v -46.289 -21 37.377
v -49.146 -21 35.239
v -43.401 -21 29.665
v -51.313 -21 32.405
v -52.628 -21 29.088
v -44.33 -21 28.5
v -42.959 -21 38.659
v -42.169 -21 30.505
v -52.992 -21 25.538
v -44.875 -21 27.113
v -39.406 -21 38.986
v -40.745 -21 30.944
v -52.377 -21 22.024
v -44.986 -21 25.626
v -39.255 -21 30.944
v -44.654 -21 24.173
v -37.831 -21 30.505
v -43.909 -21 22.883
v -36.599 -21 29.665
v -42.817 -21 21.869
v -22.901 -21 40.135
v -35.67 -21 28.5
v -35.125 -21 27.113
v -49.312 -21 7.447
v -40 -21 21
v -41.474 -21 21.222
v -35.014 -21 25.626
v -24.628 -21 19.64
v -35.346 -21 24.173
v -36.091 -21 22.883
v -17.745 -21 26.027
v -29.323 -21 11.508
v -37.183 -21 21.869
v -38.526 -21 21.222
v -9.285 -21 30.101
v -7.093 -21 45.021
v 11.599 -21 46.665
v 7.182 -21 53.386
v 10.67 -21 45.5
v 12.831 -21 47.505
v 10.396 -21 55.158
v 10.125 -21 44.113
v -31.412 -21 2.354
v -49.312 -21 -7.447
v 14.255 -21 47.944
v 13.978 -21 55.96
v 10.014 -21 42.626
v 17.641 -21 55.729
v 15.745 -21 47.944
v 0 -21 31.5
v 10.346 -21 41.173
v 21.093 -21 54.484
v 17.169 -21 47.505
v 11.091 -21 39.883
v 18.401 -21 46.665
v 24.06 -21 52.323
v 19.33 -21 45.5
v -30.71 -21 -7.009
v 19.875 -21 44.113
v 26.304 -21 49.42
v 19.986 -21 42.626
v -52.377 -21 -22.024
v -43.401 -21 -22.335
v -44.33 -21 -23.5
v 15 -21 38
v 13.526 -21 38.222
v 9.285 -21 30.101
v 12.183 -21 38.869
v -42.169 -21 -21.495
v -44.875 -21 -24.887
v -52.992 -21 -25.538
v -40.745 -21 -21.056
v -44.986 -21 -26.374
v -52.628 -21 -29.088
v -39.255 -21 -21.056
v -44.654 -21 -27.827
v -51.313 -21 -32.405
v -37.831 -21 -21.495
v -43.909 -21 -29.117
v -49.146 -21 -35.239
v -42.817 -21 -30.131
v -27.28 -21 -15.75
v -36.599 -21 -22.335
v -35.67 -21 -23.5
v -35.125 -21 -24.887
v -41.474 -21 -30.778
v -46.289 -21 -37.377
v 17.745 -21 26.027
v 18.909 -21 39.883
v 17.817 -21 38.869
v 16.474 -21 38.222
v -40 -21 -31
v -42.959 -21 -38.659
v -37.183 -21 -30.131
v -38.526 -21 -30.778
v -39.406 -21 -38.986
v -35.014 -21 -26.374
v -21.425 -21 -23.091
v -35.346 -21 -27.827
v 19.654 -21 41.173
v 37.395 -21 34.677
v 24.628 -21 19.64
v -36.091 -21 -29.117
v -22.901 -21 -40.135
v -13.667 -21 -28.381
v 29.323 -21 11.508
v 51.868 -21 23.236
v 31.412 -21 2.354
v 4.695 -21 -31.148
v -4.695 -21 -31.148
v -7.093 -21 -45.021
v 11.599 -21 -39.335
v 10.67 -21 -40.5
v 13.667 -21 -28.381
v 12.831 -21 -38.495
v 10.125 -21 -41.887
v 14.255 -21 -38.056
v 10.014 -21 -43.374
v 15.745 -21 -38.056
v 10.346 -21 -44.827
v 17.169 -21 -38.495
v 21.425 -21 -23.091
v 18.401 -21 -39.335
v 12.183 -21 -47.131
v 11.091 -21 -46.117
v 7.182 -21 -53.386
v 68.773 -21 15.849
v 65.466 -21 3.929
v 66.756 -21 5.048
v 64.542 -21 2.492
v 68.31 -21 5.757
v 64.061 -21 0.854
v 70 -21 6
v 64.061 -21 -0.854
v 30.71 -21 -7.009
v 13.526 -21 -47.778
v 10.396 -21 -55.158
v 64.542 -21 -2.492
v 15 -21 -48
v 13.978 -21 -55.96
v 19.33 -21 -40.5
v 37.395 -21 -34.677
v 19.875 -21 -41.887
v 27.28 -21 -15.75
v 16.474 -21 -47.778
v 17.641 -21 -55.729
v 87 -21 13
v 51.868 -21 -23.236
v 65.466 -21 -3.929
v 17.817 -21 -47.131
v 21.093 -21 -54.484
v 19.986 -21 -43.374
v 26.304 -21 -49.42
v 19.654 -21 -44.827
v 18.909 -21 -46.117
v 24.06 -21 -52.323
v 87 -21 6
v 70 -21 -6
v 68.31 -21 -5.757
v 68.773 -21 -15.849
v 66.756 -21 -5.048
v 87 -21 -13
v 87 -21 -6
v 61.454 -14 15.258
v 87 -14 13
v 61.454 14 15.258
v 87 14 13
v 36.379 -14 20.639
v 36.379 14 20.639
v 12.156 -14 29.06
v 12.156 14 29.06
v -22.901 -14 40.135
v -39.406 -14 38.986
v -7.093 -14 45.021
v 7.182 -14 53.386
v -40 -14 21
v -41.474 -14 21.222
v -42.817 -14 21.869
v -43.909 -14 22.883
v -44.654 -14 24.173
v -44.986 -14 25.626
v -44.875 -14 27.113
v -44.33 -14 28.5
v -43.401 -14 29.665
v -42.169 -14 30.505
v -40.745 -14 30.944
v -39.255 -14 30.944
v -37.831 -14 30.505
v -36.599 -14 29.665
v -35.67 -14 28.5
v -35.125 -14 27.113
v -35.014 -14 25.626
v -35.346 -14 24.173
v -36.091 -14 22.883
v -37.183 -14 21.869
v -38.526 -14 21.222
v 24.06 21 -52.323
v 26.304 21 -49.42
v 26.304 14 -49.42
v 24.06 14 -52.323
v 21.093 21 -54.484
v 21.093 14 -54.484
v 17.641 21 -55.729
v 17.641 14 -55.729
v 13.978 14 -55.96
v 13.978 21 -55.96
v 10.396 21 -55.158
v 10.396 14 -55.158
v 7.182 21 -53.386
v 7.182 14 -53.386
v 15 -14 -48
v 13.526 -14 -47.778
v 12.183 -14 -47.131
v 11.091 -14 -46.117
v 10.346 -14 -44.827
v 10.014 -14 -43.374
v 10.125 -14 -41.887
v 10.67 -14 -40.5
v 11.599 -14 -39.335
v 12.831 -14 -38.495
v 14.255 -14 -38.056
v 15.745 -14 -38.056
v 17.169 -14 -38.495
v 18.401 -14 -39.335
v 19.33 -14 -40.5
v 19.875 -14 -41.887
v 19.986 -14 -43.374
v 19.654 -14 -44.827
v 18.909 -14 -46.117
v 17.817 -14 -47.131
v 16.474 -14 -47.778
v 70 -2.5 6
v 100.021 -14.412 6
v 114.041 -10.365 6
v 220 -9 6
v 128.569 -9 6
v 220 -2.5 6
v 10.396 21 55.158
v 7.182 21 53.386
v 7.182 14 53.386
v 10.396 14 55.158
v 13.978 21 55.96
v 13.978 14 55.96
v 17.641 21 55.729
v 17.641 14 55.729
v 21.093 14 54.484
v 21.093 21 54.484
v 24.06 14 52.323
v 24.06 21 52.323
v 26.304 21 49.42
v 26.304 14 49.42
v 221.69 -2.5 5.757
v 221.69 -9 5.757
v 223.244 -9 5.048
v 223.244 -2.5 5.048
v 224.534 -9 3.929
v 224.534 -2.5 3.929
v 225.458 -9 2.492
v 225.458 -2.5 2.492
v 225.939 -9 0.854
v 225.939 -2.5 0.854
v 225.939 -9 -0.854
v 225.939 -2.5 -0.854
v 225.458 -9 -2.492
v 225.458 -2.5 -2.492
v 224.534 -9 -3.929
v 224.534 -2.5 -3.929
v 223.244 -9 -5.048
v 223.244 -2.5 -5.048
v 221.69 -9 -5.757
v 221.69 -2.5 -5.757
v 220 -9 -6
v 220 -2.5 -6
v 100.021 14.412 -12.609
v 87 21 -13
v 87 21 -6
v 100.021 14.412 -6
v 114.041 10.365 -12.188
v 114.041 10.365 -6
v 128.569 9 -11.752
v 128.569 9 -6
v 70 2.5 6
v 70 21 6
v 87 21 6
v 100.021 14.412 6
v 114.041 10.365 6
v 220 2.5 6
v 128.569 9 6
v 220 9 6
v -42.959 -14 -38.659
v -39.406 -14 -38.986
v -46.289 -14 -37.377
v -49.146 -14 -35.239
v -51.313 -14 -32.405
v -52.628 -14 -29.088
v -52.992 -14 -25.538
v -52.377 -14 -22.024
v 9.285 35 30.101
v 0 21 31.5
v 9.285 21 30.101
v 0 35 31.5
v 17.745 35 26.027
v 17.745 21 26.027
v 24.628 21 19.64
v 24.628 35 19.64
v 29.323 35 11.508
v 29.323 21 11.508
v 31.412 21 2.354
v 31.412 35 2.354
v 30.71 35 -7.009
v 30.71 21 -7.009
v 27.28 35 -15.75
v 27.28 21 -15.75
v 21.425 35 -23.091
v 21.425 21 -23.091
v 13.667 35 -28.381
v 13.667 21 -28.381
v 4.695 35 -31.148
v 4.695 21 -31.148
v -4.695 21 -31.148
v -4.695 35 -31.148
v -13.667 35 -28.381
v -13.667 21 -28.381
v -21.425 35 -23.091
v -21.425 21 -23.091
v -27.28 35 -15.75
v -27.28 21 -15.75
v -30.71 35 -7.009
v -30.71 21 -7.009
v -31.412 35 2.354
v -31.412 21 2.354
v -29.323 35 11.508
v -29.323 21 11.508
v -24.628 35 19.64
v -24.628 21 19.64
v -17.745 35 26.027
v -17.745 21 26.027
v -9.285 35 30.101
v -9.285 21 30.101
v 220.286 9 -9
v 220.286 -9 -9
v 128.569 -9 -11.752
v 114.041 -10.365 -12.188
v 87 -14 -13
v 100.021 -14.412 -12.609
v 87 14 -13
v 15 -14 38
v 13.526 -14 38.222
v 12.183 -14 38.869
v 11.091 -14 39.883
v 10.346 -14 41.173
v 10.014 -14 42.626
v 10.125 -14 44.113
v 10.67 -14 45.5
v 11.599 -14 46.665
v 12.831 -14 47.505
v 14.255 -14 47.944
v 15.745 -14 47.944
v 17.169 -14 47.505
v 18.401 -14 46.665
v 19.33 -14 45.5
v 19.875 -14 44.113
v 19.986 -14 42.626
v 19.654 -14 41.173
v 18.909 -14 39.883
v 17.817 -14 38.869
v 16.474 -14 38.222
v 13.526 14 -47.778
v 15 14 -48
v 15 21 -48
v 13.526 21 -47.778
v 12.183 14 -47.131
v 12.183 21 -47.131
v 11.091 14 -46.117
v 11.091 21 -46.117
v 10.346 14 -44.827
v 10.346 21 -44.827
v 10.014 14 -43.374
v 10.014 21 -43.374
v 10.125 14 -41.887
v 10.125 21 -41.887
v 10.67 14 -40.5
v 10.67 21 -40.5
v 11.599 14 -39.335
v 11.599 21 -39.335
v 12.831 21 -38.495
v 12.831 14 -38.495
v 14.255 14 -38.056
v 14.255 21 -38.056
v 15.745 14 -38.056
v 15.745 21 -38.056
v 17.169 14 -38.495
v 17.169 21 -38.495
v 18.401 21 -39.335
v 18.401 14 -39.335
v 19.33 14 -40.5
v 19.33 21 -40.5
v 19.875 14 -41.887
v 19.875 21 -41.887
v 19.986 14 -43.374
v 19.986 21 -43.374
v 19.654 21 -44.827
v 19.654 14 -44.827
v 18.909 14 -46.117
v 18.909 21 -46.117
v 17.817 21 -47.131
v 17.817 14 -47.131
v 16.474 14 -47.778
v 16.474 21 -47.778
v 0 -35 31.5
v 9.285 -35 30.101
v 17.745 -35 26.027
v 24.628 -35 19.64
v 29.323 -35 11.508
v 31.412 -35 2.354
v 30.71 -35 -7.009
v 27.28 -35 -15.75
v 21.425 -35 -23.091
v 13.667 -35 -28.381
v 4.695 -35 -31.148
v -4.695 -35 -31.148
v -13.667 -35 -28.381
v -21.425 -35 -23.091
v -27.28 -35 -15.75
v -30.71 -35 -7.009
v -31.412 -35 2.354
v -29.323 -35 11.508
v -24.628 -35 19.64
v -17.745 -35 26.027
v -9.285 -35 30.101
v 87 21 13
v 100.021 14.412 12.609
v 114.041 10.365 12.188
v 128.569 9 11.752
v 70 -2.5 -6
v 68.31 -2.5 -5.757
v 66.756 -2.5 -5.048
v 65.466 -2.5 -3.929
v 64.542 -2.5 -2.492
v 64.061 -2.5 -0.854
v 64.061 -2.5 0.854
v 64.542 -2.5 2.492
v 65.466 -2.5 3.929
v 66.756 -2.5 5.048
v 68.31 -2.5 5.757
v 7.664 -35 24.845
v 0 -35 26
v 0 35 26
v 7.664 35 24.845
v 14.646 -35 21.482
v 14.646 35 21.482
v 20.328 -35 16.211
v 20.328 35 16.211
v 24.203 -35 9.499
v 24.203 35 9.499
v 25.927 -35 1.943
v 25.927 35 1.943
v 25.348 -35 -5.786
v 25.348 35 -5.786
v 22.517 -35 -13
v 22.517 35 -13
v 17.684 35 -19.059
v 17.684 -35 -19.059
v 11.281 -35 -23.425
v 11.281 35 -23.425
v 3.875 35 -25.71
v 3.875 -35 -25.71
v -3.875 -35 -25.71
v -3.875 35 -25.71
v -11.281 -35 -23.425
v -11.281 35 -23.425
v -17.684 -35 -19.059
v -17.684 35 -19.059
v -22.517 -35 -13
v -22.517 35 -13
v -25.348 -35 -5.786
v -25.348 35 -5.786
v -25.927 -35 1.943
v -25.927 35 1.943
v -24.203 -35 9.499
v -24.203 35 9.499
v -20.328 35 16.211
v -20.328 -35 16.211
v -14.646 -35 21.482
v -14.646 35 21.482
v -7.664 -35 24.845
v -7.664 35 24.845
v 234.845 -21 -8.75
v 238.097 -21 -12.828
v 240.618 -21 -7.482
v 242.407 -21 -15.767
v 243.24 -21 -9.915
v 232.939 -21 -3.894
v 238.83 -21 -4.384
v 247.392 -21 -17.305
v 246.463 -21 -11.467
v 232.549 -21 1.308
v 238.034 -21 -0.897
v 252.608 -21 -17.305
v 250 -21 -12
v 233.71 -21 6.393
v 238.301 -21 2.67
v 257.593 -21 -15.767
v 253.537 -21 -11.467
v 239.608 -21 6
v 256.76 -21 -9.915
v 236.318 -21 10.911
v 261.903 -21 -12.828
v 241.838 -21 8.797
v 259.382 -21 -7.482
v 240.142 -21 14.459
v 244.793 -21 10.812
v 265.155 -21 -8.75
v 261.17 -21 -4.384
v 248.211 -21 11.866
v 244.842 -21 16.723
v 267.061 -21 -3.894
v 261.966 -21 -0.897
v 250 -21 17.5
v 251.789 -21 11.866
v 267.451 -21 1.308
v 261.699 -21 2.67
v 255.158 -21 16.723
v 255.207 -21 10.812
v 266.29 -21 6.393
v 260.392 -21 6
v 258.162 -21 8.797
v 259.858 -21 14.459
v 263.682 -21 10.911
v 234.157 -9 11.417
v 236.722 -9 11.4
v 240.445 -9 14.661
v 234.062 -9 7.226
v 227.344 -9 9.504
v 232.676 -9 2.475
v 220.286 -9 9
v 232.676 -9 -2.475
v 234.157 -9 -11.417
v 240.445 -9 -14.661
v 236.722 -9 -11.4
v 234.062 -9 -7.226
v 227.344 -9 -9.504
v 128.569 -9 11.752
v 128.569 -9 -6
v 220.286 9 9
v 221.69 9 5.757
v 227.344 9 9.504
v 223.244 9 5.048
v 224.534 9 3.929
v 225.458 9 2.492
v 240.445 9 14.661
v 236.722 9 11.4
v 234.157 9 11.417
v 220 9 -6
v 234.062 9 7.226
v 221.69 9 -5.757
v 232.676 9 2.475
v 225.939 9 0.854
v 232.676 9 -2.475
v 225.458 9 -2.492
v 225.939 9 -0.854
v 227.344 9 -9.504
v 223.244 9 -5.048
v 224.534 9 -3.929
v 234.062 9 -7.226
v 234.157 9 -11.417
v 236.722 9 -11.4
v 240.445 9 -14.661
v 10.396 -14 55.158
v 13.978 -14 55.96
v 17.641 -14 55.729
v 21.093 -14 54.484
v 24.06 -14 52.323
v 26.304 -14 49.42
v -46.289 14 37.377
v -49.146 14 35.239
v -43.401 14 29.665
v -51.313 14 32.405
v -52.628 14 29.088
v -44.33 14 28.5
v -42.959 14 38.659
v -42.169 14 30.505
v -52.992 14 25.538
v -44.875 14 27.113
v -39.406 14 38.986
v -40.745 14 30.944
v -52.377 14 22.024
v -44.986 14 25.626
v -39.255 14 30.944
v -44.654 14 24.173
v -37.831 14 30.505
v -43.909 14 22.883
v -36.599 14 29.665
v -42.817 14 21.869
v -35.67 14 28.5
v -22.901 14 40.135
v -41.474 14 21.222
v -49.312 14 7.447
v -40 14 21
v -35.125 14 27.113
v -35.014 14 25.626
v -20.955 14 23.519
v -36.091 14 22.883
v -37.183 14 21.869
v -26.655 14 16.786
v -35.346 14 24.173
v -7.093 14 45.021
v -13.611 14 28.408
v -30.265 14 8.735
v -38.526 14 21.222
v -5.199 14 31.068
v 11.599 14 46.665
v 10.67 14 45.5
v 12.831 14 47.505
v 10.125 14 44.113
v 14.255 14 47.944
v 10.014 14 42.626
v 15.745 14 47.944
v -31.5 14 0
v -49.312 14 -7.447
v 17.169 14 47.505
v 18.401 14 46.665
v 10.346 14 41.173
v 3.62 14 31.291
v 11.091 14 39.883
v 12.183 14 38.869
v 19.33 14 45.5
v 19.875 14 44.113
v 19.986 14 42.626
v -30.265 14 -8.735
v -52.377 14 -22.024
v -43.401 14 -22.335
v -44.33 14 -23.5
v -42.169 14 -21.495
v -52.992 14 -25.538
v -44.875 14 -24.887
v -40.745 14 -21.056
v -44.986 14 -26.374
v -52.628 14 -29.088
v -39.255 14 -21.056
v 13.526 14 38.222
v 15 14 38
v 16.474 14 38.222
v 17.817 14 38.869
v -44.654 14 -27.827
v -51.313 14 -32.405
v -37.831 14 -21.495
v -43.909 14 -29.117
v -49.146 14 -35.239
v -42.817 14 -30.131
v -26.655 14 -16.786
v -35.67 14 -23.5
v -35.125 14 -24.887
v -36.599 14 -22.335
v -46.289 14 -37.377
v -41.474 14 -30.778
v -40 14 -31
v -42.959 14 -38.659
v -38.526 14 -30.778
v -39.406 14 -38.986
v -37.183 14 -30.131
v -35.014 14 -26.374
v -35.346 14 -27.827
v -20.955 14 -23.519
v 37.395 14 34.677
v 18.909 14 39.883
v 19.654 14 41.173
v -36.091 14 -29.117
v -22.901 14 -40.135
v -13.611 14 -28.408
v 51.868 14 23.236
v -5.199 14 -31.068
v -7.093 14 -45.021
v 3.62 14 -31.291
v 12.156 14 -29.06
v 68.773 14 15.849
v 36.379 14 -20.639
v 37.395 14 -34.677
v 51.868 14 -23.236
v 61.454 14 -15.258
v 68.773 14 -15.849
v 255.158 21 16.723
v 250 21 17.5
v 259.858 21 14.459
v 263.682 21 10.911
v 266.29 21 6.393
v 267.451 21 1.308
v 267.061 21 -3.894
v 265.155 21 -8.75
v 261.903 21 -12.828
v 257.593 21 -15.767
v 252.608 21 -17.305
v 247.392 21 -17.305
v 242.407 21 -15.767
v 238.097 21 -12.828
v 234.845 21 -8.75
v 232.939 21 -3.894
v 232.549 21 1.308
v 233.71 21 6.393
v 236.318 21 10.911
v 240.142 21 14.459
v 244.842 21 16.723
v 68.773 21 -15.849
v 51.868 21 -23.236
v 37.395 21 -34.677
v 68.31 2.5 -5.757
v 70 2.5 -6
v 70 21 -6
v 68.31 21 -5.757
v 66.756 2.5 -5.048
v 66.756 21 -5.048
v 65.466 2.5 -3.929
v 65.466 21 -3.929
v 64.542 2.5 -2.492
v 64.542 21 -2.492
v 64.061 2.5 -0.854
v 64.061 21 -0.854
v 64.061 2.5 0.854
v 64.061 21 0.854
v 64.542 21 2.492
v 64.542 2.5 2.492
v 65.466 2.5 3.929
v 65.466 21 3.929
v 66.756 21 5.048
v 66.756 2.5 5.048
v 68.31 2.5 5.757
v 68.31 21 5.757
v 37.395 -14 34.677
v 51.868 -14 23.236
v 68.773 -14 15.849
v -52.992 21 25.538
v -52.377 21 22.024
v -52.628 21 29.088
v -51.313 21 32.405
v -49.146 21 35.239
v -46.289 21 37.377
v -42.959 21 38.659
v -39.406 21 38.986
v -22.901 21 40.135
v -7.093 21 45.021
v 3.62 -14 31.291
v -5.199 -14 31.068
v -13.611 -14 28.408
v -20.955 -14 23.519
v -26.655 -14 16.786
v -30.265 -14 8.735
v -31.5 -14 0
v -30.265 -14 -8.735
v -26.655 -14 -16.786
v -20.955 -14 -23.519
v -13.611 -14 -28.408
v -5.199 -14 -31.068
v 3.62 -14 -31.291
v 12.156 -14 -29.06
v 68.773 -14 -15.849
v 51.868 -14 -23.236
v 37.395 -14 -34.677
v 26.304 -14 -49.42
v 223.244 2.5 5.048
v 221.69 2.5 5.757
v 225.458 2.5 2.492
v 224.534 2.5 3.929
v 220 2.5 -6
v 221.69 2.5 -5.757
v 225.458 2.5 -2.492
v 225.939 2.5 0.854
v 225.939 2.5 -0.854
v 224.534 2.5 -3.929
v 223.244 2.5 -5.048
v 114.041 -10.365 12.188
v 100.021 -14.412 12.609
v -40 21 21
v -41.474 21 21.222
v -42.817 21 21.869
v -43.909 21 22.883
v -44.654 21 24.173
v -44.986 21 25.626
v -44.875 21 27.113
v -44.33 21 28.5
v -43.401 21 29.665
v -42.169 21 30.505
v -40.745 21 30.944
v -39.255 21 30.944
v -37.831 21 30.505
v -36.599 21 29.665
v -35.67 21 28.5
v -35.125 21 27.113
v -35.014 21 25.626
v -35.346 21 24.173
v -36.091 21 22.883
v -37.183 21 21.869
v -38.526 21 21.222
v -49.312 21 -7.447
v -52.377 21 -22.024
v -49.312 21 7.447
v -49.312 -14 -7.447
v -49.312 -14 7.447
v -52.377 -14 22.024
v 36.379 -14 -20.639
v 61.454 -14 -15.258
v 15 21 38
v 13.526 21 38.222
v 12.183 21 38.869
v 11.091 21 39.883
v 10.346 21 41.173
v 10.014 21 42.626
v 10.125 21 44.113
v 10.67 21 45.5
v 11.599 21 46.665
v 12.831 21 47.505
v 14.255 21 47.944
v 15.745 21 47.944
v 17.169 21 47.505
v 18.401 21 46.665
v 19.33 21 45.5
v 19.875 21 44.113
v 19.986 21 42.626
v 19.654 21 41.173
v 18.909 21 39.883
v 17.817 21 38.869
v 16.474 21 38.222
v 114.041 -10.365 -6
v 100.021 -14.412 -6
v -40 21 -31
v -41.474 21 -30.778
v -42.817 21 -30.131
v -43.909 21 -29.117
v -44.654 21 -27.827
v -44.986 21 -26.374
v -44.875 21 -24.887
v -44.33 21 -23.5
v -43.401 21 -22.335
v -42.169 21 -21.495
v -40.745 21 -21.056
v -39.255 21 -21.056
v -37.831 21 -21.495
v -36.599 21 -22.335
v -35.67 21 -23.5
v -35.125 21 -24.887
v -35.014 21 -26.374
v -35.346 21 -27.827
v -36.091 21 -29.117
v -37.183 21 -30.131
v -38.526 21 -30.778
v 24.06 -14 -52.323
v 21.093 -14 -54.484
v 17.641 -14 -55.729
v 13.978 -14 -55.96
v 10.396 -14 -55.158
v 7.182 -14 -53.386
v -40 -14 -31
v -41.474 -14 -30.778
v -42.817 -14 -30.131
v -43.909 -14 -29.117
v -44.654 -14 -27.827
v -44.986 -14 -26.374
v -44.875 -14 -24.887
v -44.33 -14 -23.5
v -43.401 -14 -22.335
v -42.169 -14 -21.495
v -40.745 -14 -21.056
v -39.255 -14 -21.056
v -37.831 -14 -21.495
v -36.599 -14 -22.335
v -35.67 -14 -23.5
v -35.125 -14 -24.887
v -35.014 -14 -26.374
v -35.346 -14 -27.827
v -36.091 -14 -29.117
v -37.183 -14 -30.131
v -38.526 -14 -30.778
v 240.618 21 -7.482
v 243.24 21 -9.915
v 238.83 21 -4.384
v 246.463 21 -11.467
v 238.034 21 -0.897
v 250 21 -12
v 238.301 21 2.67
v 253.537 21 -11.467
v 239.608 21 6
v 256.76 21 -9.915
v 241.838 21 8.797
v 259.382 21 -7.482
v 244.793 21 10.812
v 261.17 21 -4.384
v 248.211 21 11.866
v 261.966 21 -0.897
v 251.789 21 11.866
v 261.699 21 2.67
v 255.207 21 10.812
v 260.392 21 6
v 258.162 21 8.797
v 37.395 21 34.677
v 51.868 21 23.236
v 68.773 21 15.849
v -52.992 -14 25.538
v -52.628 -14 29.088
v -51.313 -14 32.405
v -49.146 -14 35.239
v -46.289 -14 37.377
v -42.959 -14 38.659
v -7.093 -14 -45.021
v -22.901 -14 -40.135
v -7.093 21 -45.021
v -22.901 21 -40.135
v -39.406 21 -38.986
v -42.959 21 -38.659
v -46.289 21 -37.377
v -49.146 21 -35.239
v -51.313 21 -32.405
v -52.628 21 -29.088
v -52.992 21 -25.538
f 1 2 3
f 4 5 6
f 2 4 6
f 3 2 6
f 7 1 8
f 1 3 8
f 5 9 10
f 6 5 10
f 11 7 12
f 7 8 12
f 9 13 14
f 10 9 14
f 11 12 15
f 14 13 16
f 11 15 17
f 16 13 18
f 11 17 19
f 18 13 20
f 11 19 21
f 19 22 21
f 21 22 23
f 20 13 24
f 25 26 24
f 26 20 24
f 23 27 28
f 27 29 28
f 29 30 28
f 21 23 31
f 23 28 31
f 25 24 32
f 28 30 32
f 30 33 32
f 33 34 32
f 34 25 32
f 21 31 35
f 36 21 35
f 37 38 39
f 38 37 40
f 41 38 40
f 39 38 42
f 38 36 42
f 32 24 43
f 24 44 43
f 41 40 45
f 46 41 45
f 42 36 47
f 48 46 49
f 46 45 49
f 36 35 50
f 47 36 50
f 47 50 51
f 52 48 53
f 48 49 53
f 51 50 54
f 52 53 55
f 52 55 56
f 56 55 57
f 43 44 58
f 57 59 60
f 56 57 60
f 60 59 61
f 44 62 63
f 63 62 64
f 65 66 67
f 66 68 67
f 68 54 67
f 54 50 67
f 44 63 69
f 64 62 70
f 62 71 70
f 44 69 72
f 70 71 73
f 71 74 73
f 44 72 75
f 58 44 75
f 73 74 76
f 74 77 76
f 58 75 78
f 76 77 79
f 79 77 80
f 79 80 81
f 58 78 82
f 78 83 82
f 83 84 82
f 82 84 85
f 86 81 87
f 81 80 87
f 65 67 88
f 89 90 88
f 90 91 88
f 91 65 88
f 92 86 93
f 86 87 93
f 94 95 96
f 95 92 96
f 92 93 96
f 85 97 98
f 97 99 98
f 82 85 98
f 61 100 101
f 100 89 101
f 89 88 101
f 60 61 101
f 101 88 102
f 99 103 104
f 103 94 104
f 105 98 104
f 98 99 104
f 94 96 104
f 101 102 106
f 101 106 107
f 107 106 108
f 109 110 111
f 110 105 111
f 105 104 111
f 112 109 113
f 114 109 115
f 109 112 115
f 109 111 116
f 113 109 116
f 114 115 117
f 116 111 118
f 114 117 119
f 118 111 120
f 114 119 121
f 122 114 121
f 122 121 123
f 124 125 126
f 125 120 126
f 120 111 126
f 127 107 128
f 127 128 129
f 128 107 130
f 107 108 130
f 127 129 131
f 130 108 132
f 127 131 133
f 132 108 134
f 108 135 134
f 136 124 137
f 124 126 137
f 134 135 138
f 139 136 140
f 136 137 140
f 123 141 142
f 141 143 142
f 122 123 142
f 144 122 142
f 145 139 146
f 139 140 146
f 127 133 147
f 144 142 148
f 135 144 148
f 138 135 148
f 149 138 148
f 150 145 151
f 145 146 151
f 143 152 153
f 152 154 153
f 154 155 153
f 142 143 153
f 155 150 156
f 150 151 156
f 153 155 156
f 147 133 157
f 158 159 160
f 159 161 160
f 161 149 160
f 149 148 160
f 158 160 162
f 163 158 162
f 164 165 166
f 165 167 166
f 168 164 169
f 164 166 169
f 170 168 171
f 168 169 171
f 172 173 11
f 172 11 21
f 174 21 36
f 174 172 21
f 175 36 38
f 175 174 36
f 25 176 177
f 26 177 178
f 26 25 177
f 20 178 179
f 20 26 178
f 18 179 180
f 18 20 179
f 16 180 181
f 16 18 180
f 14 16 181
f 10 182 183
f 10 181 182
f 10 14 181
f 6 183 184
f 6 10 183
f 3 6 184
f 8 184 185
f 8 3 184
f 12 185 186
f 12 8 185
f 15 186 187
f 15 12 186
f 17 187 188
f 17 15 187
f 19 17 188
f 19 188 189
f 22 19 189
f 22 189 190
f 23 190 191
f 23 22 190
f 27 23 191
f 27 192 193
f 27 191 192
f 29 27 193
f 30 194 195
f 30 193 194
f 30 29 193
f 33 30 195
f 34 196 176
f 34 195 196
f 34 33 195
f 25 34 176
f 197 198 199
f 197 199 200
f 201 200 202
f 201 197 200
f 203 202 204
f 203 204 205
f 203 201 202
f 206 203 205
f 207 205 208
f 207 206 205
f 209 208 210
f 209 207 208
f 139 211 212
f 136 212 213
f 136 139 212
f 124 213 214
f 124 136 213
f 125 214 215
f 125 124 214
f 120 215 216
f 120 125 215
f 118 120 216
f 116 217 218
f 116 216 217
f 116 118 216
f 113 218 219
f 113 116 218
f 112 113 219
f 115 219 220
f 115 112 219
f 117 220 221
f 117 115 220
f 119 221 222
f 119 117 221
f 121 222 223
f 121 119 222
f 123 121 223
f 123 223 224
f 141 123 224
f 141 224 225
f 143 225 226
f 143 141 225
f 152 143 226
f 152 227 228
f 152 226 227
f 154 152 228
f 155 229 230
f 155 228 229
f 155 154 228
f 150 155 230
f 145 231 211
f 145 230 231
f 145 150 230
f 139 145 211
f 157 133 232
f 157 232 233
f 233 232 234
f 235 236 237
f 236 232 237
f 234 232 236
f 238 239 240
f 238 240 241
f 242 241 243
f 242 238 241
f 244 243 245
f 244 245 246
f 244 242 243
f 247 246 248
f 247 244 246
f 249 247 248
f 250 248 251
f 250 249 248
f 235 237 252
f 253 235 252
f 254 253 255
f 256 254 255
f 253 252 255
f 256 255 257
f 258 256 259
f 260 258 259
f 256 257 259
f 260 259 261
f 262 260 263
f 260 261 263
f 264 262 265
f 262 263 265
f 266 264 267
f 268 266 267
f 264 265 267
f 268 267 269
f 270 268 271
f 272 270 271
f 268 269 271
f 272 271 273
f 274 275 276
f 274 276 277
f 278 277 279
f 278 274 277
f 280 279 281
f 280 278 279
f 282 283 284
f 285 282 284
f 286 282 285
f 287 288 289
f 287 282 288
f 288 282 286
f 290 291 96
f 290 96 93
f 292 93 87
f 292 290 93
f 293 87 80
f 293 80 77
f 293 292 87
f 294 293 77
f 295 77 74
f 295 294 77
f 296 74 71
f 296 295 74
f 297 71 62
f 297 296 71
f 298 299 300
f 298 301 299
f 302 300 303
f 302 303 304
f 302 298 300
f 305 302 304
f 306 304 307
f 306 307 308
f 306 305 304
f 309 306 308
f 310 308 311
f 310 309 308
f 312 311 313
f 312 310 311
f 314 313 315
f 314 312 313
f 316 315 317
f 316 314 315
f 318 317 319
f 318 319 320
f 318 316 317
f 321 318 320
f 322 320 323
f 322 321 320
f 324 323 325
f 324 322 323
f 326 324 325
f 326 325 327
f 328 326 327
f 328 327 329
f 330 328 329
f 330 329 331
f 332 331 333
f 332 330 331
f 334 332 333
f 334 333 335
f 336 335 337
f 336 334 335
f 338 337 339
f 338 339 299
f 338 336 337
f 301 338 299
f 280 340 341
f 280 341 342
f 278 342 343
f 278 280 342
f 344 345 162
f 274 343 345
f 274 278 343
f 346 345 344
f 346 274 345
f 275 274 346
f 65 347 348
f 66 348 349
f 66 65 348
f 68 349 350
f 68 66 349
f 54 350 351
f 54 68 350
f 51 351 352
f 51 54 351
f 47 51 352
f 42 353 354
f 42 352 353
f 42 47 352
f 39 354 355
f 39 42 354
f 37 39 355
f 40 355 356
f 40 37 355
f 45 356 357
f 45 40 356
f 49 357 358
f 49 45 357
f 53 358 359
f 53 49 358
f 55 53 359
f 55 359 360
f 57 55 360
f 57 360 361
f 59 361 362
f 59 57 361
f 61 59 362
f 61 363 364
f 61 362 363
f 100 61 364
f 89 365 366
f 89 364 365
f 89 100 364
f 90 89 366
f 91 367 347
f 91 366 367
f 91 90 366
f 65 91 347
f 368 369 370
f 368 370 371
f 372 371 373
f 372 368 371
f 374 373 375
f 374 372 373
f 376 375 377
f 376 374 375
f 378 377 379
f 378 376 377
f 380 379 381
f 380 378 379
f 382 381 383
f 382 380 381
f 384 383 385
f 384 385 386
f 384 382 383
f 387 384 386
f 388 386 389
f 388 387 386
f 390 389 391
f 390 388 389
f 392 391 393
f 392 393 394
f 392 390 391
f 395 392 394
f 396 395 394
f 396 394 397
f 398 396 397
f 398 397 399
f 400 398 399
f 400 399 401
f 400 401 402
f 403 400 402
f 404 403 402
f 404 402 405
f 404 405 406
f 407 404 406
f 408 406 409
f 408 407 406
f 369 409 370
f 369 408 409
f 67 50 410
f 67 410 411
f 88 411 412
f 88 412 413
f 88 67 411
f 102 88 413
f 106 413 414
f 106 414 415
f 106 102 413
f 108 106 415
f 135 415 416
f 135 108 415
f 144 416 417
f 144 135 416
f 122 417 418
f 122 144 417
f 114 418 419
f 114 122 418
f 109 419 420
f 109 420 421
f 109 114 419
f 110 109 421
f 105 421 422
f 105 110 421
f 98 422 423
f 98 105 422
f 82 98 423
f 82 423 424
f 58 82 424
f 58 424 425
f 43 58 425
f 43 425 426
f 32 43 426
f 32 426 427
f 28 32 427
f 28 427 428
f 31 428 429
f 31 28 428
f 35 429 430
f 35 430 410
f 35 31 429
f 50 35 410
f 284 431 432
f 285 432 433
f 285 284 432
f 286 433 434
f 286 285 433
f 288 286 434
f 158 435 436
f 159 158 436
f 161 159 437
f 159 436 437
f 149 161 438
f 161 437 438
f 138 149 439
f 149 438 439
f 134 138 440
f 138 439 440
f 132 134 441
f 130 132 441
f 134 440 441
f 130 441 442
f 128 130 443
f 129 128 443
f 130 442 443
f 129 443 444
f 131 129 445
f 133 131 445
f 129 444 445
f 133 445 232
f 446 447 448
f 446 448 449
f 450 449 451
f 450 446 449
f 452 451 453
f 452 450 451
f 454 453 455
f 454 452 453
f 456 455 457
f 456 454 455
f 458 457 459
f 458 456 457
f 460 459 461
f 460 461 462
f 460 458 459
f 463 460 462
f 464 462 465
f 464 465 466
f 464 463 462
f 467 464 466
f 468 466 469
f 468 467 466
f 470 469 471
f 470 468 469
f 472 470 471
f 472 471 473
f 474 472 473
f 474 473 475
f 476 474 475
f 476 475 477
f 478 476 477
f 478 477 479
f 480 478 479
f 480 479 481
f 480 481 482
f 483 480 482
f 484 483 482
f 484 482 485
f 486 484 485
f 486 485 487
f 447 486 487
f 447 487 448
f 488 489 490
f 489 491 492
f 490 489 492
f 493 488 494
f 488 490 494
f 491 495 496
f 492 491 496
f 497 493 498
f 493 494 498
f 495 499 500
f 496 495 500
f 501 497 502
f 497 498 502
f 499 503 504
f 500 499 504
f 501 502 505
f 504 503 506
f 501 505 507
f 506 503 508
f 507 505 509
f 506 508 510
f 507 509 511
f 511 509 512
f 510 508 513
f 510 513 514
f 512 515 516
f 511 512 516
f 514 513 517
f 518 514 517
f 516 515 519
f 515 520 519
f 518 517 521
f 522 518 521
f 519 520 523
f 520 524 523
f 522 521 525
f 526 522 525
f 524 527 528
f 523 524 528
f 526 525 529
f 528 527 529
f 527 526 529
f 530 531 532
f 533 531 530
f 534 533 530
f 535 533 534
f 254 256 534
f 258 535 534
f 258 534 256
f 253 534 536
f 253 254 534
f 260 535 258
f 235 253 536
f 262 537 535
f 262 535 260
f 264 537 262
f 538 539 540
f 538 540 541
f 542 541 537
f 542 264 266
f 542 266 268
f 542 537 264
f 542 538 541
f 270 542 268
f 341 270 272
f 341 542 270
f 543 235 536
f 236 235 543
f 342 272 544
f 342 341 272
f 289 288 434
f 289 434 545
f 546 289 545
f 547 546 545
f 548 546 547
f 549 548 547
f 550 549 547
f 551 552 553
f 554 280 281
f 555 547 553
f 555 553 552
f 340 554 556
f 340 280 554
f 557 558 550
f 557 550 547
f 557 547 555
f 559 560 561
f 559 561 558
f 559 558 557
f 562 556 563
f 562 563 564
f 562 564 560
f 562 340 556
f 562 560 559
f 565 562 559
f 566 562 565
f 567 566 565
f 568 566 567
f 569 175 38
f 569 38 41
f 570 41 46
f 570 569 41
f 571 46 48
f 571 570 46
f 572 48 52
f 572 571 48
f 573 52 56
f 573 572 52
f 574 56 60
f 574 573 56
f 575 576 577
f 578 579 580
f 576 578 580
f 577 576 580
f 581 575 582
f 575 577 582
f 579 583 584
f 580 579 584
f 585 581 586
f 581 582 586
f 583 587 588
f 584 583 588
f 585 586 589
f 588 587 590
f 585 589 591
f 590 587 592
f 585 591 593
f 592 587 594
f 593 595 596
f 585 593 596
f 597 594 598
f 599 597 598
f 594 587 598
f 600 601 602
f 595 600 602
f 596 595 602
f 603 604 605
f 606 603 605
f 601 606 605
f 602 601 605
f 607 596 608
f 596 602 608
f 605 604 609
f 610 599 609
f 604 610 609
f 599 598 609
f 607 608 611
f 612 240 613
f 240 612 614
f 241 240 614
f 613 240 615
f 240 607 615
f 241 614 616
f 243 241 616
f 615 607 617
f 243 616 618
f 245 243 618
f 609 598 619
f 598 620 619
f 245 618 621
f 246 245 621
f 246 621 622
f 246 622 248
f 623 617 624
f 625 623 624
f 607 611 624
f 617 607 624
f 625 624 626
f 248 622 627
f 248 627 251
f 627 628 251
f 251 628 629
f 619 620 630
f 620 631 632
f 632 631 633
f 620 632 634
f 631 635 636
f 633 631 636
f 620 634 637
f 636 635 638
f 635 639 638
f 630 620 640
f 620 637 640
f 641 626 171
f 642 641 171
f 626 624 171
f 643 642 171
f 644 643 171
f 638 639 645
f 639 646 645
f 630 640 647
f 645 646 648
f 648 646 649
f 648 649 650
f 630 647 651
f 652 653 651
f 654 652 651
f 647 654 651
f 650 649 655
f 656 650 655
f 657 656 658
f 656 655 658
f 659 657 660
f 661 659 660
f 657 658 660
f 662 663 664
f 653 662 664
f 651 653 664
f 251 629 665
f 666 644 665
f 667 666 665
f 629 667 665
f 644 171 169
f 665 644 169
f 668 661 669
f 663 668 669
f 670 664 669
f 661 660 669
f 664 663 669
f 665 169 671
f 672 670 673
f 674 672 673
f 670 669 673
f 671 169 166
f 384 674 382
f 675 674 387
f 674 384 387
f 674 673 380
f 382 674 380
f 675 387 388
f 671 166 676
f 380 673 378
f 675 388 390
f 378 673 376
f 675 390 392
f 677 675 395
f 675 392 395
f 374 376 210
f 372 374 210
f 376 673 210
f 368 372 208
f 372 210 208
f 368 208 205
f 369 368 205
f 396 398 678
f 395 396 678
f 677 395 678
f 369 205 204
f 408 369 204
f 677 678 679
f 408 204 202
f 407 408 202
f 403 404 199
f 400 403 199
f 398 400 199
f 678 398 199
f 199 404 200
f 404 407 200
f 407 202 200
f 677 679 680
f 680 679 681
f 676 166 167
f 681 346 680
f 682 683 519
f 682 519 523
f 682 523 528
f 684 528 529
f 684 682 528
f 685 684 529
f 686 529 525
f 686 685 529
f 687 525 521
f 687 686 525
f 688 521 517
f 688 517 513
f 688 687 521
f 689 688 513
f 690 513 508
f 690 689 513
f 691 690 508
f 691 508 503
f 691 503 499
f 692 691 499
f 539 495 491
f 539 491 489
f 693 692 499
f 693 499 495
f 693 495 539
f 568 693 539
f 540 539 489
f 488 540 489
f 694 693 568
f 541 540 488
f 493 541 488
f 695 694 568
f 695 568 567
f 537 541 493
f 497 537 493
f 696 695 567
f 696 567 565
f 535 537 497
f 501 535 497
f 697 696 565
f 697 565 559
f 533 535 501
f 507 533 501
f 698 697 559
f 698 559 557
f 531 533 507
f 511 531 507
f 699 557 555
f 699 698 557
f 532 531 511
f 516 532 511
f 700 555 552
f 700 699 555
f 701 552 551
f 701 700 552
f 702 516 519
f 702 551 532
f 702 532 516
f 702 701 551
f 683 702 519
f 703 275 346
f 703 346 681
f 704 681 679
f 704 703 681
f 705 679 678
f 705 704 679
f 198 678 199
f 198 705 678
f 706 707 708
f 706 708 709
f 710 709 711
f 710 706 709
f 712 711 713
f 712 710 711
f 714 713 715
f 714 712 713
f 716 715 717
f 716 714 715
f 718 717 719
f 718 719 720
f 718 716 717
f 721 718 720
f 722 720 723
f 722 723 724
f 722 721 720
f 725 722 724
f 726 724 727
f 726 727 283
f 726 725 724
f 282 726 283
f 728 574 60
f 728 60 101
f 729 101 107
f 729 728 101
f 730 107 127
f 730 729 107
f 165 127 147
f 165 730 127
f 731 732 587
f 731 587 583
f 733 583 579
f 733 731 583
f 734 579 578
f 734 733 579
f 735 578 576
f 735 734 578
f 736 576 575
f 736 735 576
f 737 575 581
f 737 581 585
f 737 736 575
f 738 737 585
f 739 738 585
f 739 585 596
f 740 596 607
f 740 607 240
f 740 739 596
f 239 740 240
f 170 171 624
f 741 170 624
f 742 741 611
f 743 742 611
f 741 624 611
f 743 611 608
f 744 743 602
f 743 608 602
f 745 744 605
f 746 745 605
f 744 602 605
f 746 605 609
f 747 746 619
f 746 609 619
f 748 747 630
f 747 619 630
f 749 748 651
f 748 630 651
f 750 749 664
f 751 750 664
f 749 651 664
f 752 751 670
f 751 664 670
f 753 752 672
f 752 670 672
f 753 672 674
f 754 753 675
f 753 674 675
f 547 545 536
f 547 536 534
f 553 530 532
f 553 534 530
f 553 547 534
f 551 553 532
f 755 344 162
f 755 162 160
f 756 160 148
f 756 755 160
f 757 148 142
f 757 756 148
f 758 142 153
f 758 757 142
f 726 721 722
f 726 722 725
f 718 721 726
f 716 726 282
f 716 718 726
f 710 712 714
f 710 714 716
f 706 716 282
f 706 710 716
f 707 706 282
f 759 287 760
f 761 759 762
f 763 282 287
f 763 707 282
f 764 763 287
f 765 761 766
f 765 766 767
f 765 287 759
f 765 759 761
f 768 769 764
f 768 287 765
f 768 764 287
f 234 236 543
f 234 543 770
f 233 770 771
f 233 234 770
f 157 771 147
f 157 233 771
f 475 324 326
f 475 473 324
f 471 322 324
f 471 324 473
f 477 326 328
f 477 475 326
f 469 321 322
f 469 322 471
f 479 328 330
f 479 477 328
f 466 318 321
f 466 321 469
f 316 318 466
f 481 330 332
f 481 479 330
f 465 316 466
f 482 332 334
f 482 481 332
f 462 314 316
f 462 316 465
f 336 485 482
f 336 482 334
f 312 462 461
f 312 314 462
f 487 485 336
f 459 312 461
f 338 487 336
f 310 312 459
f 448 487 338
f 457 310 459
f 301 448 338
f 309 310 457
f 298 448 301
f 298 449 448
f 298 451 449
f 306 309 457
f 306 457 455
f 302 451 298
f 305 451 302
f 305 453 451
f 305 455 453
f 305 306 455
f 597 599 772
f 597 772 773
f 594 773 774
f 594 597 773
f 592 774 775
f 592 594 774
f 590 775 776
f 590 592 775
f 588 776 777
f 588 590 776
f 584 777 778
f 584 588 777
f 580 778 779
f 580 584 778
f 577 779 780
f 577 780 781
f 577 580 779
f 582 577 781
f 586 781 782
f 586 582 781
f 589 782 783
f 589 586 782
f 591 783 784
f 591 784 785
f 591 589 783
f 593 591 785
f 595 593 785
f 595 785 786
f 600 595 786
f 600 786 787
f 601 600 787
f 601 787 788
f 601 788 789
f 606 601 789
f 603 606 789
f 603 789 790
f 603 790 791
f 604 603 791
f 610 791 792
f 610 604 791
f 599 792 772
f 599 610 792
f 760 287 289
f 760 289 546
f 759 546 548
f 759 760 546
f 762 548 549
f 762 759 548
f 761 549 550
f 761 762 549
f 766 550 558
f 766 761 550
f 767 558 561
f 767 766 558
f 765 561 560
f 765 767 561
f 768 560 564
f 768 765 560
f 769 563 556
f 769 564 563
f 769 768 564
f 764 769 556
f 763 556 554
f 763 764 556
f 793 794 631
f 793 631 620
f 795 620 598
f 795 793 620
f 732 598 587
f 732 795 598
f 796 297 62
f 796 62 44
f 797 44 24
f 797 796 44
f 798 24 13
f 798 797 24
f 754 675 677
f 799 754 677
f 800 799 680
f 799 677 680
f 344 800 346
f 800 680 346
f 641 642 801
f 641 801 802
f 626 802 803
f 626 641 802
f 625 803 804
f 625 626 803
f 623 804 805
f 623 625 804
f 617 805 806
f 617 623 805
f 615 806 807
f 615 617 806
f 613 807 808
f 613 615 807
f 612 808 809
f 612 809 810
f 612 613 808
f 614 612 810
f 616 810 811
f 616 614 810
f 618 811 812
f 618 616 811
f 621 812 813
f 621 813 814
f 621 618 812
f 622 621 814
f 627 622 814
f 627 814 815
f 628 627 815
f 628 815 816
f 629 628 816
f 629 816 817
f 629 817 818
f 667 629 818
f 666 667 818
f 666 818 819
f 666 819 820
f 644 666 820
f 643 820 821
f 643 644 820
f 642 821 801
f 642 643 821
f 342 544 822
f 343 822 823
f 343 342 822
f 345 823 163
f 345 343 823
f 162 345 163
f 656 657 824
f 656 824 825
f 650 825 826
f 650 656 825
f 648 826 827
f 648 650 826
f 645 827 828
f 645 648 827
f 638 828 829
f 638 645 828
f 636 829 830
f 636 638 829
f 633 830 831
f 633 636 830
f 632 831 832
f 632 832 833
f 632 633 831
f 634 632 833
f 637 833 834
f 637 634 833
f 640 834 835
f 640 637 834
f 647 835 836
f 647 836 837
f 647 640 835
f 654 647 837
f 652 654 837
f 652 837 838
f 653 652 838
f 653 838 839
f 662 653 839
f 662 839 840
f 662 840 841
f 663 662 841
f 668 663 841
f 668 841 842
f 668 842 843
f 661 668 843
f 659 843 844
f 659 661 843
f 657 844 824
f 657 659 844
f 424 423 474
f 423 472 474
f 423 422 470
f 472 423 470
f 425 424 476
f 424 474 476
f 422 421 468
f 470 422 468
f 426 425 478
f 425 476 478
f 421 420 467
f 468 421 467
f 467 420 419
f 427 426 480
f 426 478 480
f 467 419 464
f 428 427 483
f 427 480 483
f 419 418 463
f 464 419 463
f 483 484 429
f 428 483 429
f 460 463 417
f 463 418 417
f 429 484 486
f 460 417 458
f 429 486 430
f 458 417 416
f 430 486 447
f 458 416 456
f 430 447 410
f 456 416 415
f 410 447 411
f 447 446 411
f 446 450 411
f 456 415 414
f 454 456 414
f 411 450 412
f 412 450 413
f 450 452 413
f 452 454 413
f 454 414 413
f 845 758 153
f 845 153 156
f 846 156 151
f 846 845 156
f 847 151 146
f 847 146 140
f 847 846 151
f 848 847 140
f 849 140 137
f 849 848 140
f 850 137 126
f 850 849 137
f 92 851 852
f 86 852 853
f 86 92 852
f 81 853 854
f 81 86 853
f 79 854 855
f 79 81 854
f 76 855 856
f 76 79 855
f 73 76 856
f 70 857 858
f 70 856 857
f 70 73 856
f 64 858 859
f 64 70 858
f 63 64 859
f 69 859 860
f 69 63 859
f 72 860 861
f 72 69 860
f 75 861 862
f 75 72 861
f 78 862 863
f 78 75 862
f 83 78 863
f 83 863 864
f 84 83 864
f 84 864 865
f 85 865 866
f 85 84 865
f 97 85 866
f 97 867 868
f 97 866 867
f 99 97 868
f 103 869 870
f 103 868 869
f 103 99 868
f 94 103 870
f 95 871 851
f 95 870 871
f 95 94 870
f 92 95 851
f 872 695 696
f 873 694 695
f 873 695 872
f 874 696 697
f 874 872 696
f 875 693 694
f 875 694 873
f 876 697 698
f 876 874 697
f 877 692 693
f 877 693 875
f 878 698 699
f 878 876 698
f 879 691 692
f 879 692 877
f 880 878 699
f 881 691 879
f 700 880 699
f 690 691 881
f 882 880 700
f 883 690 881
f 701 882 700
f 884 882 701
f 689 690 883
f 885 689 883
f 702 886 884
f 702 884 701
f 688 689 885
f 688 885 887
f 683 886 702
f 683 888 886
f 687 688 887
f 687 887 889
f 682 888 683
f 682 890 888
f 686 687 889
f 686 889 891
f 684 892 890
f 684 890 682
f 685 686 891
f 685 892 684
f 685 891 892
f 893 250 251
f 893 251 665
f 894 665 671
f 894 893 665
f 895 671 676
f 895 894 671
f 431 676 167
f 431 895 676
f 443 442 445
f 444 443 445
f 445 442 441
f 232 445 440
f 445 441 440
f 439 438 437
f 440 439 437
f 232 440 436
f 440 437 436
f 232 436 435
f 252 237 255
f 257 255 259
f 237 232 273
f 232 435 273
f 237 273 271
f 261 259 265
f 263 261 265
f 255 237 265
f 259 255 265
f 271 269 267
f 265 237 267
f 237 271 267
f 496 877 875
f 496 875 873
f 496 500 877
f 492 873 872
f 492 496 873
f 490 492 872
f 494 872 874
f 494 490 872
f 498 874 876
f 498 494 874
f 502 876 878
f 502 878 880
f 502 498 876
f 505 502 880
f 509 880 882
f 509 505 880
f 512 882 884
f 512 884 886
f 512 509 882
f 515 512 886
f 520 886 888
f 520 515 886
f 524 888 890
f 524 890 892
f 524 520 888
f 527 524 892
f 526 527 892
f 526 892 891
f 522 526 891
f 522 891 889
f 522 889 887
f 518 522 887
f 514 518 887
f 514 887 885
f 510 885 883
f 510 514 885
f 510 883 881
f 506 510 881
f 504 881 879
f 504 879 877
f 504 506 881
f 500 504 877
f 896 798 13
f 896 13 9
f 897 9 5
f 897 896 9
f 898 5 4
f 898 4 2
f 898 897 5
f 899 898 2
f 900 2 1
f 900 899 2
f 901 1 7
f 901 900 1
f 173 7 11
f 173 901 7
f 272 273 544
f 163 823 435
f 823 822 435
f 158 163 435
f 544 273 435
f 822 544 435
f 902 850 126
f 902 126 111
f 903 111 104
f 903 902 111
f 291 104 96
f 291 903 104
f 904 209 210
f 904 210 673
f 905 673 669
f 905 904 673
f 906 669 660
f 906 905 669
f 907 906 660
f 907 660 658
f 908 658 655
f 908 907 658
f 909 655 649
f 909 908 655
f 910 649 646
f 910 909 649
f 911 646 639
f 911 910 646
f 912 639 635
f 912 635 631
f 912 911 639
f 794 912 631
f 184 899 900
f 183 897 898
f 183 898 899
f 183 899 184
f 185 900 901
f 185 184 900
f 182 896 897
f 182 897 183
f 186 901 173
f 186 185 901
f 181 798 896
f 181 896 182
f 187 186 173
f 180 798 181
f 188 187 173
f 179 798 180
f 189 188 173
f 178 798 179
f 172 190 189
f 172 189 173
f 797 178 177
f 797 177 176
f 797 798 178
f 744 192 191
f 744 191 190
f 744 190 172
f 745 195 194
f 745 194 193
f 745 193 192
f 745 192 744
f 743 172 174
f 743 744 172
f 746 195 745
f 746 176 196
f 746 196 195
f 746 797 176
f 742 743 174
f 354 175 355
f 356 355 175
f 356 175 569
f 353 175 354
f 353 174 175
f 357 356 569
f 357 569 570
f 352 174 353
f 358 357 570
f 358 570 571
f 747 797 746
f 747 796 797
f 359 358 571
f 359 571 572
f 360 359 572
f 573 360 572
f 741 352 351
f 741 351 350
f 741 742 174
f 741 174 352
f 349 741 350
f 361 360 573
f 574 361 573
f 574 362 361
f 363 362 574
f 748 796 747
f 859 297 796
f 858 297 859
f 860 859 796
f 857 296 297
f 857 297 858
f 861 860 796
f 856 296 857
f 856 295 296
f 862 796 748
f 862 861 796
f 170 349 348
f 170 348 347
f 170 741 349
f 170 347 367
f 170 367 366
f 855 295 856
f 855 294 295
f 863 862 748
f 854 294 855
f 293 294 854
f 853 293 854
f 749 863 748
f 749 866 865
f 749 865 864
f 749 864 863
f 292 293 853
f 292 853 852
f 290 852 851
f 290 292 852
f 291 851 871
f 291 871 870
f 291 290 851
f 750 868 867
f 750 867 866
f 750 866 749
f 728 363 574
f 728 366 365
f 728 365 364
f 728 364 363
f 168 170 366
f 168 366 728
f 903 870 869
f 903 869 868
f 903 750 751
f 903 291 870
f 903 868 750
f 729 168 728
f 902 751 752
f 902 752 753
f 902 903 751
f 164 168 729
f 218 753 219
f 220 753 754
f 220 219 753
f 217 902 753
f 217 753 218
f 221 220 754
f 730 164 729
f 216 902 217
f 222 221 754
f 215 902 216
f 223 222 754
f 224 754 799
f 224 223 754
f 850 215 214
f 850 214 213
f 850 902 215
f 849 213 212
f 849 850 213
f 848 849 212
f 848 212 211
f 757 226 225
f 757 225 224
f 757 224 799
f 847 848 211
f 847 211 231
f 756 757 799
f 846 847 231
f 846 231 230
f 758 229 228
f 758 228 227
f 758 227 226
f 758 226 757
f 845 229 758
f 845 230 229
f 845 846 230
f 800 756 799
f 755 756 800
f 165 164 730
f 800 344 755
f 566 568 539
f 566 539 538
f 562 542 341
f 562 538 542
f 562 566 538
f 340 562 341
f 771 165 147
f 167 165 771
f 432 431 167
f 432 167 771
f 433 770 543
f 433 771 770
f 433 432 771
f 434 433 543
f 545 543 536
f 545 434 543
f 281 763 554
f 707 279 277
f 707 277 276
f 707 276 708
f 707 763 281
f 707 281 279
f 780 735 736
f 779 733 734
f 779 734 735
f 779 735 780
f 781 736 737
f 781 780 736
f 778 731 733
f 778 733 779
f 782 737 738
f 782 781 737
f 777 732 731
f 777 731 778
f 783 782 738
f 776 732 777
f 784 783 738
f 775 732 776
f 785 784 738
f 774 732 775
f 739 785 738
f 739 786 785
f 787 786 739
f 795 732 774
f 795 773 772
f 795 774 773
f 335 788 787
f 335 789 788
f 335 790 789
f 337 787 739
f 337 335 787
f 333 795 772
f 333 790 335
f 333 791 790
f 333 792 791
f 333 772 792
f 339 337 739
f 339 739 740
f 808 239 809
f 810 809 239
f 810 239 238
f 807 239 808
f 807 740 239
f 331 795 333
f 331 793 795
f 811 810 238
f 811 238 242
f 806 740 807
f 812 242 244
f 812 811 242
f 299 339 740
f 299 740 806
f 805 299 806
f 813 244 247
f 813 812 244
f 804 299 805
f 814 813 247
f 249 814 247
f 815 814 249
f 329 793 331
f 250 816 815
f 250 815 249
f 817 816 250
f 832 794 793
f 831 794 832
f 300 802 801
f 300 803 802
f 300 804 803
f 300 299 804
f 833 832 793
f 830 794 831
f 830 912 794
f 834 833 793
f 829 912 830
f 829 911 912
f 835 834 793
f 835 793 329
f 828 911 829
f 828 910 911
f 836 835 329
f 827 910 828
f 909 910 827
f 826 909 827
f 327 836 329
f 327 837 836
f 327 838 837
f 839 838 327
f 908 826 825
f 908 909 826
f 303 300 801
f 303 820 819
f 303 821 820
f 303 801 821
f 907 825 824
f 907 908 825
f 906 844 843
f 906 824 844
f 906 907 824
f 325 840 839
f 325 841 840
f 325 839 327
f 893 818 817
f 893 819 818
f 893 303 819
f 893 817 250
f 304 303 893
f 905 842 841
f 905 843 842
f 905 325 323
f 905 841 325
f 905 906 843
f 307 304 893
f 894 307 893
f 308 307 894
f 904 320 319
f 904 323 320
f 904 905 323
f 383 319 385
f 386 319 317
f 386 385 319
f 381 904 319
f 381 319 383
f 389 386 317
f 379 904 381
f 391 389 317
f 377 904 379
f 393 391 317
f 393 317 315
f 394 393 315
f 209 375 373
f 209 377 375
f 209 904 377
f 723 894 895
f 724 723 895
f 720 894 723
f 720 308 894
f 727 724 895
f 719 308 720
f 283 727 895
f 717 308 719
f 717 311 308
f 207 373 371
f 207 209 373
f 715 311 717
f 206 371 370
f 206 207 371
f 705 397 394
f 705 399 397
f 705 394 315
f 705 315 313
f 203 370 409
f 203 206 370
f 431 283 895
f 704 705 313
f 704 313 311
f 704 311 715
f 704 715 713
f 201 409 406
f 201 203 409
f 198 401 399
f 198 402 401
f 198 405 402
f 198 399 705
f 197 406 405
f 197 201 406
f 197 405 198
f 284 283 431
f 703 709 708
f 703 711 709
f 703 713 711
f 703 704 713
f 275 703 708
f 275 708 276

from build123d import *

# Parameters (mm, degrees)
SKETCH1_R               = 31.5
SKETCH1_R_2             = 26
BOSS_EXTRUDE1_DEPTH     = 35
SKETCH1_3_R             = 31.5
SKETCH1_3_R_2           = 26
BOSS_EXTRUDE2_DEPTH     = 21
SKETCH2_R               = 5
BOSS_EXTRUDE7_DEPTH     = 21
CUT_EXTRUDE3_DEPTH      = 250.349008072
CUT_EXTRUDE3_DEPTH_BACK = 250.349008072
SKETCH2_6_R             = 17.5
SKETCH2_6_R_2           = 12
BOSS_EXTRUDE8_DEPTH     = 21
CUT_EXTRUDE4_START      = 2.5
CUT_EXTRUDE4_DEPTH      = 18.5
CUT_EXTRUDE5_DEPTH      = 14
CUT_EXTRUDE7_DEPTH      = 276.530851267
CUT_EXTRUDE7_DEPTH_BACK = 276.530851267
SKETCH1_5_R             = 26


# Read off the part's stored shape, not the designer's step: Cut-Extrude4
with BuildPart() as part:
    # Sketch1 → Boss-Extrude1 (new, symmetric)
    with BuildSketch(Plane(origin=(0, 0, 0), x_dir=(1, 0, 0), z_dir=(0, 1, 0))):
        with Locations(Location((0, 0, 0), (0, 0, 270))):
            Circle(SKETCH1_R)
        with Locations(Location((0, 0, 0), (0, 0, 270))):
            Circle(SKETCH1_R_2, mode=Mode.SUBTRACT)
    extrude(amount=BOSS_EXTRUDE1_DEPTH, both=True)

    # Sketch1<3> → Boss-Extrude2 (add, symmetric)
    with BuildSketch(Plane(origin=(0, 0, 0), x_dir=(1, 0, 0), z_dir=(0, 1, 0))):
        with Locations(Location((0, 0, 0), (0, 0, 270))):
            Circle(SKETCH1_3_R)
        with Locations(Location((0, 0, 0), (0, 0, 270))):
            Circle(SKETCH1_3_R_2, mode=Mode.SUBTRACT)
    extrude(amount=BOSS_EXTRUDE2_DEPTH, both=True)

    # Sketch2 → Boss-Extrude7 (add, symmetric)
    with BuildSketch(Plane(origin=(0, 0, 0), x_dir=(1, 0, 0), z_dir=(0, 1, 0))):
        with BuildLine():
            Line((220.285908843, 9), (87, 13))
            ThreePointArc((87, 13), (51.867643982, 23.236099658), (26.304344234, 49.419641847))
            ThreePointArc((26.304344234, 49.419641847), (17.640533854, 55.729005498), (7.181946677, 53.386435492))
            ThreePointArc((7.181946677, 53.386435492), (-14.855989459, 42.122318837), (-39.406288617, 38.986435492))
            ThreePointArc((-39.406288617, 38.986435492), (-50.326951915, 33.896458963), (-52.376901133, 22.023529412))
            ThreePointArc((-52.376901133, 22.023529412), (-48.925892025, 0), (-52.376901133, -22.023529412))
            ThreePointArc((-52.376901133, -22.023529412), (-50.326951915, -33.896458963), (-39.406288617, -38.986435492))
            ThreePointArc((-39.406288617, -38.986435492), (-14.855989459, -42.122318837), (7.181946677, -53.386435492))
            ThreePointArc((7.181946677, -53.386435492), (17.640533854, -55.729005498), (26.304344234, -49.419641847))
            ThreePointArc((26.304344234, -49.419641847), (51.867643982, -23.236099658), (87, -13))
            Line((87, -13), (220.285908843, -9))
            ThreePointArc((220.285908843, -9), (230.798886909, -10.287807913), (240.445269919, -14.661416476))
            ThreePointArc((240.445269919, -14.661416476), (232.5, 0), (240.445269919, 14.661416476))
            ThreePointArc((240.445269919, 14.661416476), (230.798886909, 10.287807913), (220.285908843, 9))
        make_face()
        with Locations(Location((15, 43, 0), (0, 0, 90))):
            Circle(SKETCH2_R, mode=Mode.SUBTRACT)
        with Locations(Location((15, -43, 0), (0, 0, 90))):
            Circle(SKETCH2_R, mode=Mode.SUBTRACT)
        with Locations(Location((-40, -26, 0), (0, 0, 90))):
            Circle(SKETCH2_R, mode=Mode.SUBTRACT)
        with Locations(Location((-40, 26, 0), (0, 0, 90))):
            Circle(SKETCH2_R, mode=Mode.SUBTRACT)
    extrude(amount=BOSS_EXTRUDE7_DEPTH, both=True)

    # Sketch6 → Cut-Extrude3 (cut, two sides: drawn at the far end of the back side and taken through both)
    with BuildSketch(Plane.XY.offset(-CUT_EXTRUDE3_DEPTH_BACK)):
        with BuildLine():
            Line((240.445269919, 21), (220.285908843, 21))
            Line((220.285908843, 21), (87, 21))
            ThreePointArc((87, 21), (106.935911729, 12.060024019), (128.569219382, 9))
            Line((128.569219382, 9), (240.445269919, 9))
            Line((240.445269919, 9), (240.445269919, 21))
        make_face()
        with BuildLine():
            Line((240.445269919, -9), (128.569219382, -9))
            ThreePointArc((128.569219382, -9), (106.935911729, -12.060024019), (87, -21))
            Line((87, -21), (240.445269919, -21))
            Line((240.445269919, -21), (240.445269919, -9))
        make_face()
    extrude(amount=CUT_EXTRUDE3_DEPTH + CUT_EXTRUDE3_DEPTH_BACK, mode=Mode.SUBTRACT)

    # Sketch2<6> → Boss-Extrude8 (add, symmetric)
    with BuildSketch(Plane(origin=(0, 0, 0), x_dir=(1, 0, 0), z_dir=(0, 1, 0))):
        with Locations(Location((250, 0, 0), (0, 0, 270))):
            Circle(SKETCH2_6_R)
        with Locations(Location((250, 0, 0), (0, 0, 90))):
            Circle(SKETCH2_6_R_2, mode=Mode.SUBTRACT)
    extrude(amount=BOSS_EXTRUDE8_DEPTH, both=True)

    # Cut-Extrude4 outline → Cut-Extrude4 (cut)
    with BuildSketch(Plane(origin=(0, 0, 0), x_dir=(1, 0, 0), z_dir=(0, 1, 0)).offset(CUT_EXTRUDE4_START)):
        with BuildLine():
            ThreePointArc((220, -6), (226, 0), (220, 6))
            Line((220, 6), (70, 6))
            ThreePointArc((70, 6), (64, 0), (70, -6))
            Line((70, -6), (220, -6))
        make_face()
    cut_extrude4 = extrude(amount=CUT_EXTRUDE4_DEPTH, mode=Mode.SUBTRACT)

    # Mirror3: Cut-Extrude4 across plane
    add(cut_extrude4.mirror(Plane.ZX), mode=Mode.SUBTRACT)

    # Sketch9 → Cut-Extrude5 (cut, symmetric)
    with BuildSketch(Plane(origin=(0, 0, 0), x_dir=(1, 0, 0), z_dir=(0, 1, 0))):
        with BuildLine():
            ThreePointArc((87, -13), (48.833727891, -17.562334102), (12.155663261, -29.060107548))
            ThreePointArc((12.155663261, -29.060107548), (-31.5, 0), (12.155663261, 29.060107548))
            ThreePointArc((12.155663261, 29.060107548), (48.833727891, 17.562334102), (87, 13))
            ThreePointArc((87, 13), (51.867643982, 23.236099658), (26.304344234, 49.419641847))
            ThreePointArc((26.304344234, 49.419641847), (17.640533854, 55.729005498), (7.181946677, 53.386435492))
            ThreePointArc((7.181946677, 53.386435492), (-14.855989459, 42.122318837), (-39.406288617, 38.986435492))
            ThreePointArc((-39.406288617, 38.986435492), (-50.326951915, 33.896458963), (-52.376901133, 22.023529412))
            ThreePointArc((-52.376901133, 22.023529412), (-48.925892025, 0), (-52.376901133, -22.023529412))
            ThreePointArc((-52.376901133, -22.023529412), (-50.326951915, -33.896458963), (-39.406288617, -38.986435492))
            ThreePointArc((-39.406288617, -38.986435492), (-14.855989459, -42.122318837), (7.181946677, -53.386435492))
            ThreePointArc((7.181946677, -53.386435492), (17.640533854, -55.729005498), (26.304344234, -49.419641847))
            ThreePointArc((26.304344234, -49.419641847), (51.867643982, -23.236099658), (87, -13))
        make_face()
    extrude(amount=CUT_EXTRUDE5_DEPTH, both=True, mode=Mode.SUBTRACT)

    # Sketch1<5> → Cut-Extrude7 (cut, two sides: drawn at the far end of the back side and taken through both)
    with BuildSketch(Plane(origin=(0, 0, 0), x_dir=(1, 0, 0), z_dir=(0, 1, 0)).offset(-CUT_EXTRUDE7_DEPTH_BACK)):
        with Locations(Location((0, 0, 0), (0, 0, 270))):
            Circle(SKETCH1_5_R)
    extrude(amount=CUT_EXTRUDE7_DEPTH + CUT_EXTRUDE7_DEPTH_BACK, mode=Mode.SUBTRACT)


solid = part.part
